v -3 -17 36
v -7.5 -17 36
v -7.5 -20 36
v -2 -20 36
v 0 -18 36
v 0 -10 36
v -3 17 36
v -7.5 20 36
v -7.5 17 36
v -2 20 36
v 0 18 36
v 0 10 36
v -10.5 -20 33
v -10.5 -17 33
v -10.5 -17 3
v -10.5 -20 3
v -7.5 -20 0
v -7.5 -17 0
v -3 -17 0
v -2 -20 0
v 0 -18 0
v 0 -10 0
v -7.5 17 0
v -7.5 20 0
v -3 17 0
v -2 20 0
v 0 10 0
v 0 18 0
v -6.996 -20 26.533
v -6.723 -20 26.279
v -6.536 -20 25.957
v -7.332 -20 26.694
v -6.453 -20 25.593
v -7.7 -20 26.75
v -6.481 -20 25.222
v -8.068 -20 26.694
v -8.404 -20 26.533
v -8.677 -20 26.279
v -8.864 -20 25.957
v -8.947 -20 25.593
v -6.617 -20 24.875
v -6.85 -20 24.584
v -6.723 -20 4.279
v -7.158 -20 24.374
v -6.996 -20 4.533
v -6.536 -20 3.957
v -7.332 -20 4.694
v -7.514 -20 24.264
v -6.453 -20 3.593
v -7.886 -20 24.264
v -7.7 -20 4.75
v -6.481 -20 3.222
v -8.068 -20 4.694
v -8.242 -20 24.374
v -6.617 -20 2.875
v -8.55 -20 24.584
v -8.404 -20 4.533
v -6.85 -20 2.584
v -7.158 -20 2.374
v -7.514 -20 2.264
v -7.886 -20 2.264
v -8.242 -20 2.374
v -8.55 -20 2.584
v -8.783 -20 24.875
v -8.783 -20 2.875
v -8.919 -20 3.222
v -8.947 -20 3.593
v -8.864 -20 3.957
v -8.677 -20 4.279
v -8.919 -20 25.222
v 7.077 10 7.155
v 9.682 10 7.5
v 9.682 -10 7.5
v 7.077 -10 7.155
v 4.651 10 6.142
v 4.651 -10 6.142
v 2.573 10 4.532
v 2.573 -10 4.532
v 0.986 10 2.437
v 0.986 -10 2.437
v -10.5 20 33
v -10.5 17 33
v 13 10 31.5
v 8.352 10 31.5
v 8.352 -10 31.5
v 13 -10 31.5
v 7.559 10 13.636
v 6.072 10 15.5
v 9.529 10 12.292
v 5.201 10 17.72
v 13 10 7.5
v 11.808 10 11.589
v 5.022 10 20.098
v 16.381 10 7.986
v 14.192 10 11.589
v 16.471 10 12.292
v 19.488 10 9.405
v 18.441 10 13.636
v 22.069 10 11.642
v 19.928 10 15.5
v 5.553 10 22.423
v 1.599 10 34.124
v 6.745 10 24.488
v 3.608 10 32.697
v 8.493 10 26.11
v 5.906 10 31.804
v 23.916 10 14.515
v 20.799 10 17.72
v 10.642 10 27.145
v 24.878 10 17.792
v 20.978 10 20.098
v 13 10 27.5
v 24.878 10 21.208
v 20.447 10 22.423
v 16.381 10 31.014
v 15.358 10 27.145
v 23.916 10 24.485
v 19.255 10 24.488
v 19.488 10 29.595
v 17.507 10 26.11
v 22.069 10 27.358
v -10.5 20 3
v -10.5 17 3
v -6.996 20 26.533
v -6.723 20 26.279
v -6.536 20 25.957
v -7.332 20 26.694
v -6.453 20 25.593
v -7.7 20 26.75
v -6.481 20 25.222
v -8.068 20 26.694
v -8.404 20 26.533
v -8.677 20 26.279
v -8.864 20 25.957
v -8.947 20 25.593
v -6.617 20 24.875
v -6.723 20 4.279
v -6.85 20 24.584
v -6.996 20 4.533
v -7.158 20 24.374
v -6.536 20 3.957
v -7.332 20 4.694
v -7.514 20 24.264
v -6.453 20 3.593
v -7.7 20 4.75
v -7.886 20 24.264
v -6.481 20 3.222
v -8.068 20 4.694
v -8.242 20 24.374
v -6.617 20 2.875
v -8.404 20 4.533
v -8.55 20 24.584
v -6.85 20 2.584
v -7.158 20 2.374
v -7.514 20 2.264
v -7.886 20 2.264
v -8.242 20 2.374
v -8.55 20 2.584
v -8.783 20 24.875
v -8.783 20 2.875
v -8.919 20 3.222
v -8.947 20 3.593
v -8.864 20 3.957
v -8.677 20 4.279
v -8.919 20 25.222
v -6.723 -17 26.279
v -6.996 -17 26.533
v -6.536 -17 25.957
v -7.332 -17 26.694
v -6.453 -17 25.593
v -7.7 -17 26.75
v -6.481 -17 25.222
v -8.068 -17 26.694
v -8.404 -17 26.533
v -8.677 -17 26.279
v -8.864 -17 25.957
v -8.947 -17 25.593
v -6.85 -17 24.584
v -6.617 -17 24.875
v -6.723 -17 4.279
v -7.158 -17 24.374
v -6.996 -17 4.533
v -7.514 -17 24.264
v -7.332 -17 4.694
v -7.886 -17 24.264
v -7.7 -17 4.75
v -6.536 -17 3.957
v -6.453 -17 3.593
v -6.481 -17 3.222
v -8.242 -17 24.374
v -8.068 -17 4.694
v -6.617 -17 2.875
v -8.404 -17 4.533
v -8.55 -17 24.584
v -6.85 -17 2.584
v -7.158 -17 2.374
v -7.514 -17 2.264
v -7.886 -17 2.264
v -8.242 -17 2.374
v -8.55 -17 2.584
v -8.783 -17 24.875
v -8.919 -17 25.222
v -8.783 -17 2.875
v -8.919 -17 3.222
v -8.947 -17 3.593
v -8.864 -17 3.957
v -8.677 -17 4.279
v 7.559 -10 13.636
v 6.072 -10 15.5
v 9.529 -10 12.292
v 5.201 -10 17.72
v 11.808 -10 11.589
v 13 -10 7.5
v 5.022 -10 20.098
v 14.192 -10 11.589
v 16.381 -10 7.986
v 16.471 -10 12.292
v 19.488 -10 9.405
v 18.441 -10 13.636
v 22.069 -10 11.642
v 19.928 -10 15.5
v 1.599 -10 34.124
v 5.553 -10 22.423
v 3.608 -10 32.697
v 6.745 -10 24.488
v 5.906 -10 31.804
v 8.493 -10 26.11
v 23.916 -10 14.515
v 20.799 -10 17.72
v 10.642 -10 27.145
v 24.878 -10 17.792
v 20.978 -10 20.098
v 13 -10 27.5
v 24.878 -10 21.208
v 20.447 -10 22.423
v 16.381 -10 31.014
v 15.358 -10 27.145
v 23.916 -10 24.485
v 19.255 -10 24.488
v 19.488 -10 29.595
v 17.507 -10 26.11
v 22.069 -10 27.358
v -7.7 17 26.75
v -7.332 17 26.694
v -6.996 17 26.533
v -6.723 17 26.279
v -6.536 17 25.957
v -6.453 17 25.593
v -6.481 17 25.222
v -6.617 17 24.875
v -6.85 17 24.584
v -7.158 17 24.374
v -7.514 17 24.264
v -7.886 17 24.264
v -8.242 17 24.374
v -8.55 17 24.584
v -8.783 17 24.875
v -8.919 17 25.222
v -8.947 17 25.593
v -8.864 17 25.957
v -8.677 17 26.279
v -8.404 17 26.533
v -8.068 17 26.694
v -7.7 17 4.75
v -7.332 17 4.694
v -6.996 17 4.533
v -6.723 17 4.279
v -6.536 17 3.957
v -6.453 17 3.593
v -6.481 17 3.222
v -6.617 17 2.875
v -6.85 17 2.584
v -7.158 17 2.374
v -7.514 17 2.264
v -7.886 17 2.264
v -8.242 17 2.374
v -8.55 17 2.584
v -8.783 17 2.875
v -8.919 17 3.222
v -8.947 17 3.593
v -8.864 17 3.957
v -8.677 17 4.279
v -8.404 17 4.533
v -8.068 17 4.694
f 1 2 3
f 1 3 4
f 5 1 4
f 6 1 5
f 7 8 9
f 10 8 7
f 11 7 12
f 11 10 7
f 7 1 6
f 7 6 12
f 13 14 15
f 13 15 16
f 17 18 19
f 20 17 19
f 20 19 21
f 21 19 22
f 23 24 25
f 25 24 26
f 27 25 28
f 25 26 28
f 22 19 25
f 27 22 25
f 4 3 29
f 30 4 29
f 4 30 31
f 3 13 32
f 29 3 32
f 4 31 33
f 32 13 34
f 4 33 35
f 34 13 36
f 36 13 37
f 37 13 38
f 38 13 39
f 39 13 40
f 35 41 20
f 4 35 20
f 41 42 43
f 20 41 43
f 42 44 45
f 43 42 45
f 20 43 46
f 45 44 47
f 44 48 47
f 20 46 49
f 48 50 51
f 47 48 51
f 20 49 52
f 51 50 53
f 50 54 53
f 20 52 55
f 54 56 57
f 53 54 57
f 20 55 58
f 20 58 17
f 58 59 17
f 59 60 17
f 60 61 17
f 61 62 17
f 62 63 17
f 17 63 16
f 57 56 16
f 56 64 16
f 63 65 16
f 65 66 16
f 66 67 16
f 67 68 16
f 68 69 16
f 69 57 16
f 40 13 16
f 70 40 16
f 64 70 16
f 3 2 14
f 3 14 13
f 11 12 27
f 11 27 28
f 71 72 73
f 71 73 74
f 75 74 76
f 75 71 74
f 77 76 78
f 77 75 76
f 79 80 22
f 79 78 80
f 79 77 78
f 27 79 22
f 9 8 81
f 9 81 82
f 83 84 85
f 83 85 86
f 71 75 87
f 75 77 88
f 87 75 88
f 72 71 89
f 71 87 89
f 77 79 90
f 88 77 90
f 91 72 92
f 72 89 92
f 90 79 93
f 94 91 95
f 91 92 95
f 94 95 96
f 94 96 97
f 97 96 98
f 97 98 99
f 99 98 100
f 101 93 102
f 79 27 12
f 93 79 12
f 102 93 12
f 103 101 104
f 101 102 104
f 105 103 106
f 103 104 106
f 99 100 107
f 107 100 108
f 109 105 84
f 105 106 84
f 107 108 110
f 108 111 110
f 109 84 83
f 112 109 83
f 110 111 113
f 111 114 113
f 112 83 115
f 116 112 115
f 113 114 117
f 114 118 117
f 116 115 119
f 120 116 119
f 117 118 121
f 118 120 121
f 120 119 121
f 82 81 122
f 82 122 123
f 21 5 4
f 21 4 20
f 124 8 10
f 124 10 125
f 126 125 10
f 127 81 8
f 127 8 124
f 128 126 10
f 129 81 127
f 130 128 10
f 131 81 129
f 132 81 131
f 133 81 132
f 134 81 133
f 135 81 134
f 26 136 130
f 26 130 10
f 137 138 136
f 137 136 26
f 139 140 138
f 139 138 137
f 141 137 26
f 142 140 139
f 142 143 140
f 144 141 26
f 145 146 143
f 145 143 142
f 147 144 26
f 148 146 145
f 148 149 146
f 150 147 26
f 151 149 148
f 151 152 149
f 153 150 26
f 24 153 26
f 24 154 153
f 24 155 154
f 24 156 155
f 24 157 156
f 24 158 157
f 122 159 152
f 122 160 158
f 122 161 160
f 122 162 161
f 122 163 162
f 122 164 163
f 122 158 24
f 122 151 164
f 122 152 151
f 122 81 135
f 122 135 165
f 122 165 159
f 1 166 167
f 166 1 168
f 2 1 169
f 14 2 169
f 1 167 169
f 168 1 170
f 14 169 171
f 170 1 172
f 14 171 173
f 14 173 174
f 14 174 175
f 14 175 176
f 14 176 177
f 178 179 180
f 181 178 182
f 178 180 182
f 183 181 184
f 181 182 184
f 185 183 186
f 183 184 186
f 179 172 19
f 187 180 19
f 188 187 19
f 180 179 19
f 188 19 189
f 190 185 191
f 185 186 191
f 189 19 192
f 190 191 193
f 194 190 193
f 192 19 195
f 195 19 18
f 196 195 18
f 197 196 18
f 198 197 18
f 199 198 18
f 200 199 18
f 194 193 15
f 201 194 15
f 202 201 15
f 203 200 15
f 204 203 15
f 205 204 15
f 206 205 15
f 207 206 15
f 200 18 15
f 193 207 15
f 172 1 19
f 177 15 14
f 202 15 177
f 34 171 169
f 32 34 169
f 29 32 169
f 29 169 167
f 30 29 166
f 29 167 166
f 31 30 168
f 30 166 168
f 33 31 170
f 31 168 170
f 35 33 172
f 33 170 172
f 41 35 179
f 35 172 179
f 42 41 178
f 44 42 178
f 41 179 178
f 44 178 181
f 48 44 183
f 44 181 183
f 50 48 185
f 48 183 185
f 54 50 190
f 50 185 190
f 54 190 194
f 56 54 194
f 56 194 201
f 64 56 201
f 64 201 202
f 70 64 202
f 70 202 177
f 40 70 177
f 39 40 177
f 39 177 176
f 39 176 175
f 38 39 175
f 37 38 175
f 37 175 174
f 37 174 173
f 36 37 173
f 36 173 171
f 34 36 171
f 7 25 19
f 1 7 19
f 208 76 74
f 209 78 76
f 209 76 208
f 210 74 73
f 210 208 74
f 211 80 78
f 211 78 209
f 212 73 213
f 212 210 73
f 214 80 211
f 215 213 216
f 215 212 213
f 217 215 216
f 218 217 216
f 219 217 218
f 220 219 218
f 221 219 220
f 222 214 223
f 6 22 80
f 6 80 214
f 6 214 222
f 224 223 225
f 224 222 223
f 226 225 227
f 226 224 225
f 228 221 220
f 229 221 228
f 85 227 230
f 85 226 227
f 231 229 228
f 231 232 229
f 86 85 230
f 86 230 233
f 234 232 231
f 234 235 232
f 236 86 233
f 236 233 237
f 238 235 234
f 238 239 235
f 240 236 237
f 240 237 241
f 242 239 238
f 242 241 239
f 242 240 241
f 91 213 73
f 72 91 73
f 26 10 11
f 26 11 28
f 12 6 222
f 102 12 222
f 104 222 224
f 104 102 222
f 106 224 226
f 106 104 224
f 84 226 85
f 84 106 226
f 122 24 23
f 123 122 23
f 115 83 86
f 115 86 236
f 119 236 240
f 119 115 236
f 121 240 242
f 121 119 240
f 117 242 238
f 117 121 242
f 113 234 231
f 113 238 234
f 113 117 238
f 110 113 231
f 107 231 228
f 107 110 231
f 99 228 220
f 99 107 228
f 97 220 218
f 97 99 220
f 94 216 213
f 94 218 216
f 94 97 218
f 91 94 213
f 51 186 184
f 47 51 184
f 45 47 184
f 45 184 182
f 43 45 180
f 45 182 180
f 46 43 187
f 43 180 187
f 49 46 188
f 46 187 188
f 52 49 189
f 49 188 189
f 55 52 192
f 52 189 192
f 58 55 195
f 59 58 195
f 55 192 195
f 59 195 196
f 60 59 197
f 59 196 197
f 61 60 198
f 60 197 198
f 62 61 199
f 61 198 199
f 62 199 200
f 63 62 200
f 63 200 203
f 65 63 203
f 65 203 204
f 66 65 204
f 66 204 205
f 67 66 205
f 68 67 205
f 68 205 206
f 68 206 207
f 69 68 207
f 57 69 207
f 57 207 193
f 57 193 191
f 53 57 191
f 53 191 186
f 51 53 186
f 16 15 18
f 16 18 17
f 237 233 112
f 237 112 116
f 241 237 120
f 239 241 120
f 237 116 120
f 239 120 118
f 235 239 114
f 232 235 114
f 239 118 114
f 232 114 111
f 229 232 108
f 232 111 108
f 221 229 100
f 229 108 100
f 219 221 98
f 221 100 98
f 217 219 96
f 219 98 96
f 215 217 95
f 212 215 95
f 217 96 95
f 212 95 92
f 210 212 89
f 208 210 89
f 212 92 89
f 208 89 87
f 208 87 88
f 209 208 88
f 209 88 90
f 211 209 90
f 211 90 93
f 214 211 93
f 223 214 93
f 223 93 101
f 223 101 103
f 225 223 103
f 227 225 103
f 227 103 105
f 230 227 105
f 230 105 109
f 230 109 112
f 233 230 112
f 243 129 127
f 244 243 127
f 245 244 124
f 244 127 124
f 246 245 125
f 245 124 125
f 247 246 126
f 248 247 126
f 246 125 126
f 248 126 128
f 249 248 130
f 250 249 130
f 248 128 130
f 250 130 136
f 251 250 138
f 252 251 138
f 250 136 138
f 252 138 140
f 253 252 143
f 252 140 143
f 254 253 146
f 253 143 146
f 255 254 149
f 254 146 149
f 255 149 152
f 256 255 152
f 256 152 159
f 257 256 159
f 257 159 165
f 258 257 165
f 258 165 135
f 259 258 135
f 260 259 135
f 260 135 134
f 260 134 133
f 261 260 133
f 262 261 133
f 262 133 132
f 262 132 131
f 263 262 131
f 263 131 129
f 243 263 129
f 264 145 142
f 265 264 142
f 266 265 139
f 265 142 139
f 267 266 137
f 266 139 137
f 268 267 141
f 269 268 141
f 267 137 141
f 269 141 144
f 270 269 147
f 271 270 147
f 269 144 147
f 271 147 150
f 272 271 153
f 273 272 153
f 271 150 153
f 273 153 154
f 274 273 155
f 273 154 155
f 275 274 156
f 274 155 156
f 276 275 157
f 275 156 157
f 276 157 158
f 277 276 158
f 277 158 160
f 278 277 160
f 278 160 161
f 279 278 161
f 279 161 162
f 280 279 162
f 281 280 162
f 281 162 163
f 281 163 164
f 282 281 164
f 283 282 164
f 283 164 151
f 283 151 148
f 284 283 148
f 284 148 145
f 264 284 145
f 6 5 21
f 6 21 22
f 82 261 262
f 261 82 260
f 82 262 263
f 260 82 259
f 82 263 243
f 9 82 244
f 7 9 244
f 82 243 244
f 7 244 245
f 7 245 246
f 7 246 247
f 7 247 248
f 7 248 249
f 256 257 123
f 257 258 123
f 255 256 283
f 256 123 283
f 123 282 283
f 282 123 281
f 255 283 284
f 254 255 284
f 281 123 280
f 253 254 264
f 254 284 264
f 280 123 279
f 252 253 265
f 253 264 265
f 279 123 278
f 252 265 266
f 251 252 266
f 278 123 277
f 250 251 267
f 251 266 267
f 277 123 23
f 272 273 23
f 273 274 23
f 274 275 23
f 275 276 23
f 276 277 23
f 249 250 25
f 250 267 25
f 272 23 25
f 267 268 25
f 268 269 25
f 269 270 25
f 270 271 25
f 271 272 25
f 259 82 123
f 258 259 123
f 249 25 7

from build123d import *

# Parameters (mm, degrees)
BOSS_EXTRUDE1_DEPTH = 36
SKETCH2_R           = 1.25
CUT_EXTRUDE1_DEPTH  = 55.829280499
CHAMFER1_SIZE       = 3
SKETCH4_R           = 8
BOSS_EXTRUDE2_DEPTH = 40
FILLET1_R           = 10
SKETCH5_W           = 25
SKETCH5_H           = 10
CUT_EXTRUDE3_DEPTH  = 49.176757882
CHAMFER2_SIZE       = 2


with BuildPart() as part:
    # Sketch1 → Boss-Extrude1 (new body)
    with BuildSketch(Plane.XY):
        Polygon((-10.5, 17), (-3, 17), (-3, -17), (-10.5, -17), (-10.5, -20), (0, -20), (0, 20), (-10.5, 20), align=None)
    extrude(amount=BOSS_EXTRUDE1_DEPTH)

    # Sketch2 → Cut-Extrude1 (cut, through all)
    with BuildSketch(Plane(origin=(0, 20, 0), x_dir=(1, 0, 0), z_dir=(0, 1, 0))):
        with Locations(Location((-7.7, -3.5, 0), (0, 0, 270))):
            Circle(SKETCH2_R)
        with Locations(Location((-7.7, -25.5, 0), (0, 0, 270))):
            Circle(SKETCH2_R)
    extrude(amount=-CUT_EXTRUDE1_DEPTH, mode=Mode.SUBTRACT)

    # Chamfer1
    chamfer1_edges = [part.edges().sort_by_distance(p)[0] for p in [
        (-10.5, 18.5, 0),
        (-10.5, -18.5, 36),
        (-10.5, 18.5, 36),
        (-10.5, -18.5, 0),
    ]]
    chamfer(chamfer1_edges, length=CHAMFER1_SIZE)

    # Sketch4 → Boss-Extrude2 (add, through all)
    with BuildSketch(Plane(origin=(0, 20, 0), x_dir=(1, 0, 0), z_dir=(0, 1, 0))):
        with BuildLine():
            Line((13, -7.5), (0, -7.5))
            Line((0, -7.5), (0, -31.5))
            Line((0, -31.5), (13, -31.5))
            ThreePointArc((13, -31.5), (25, -19.5), (13, -7.5))
        make_face()
        with Locations(Location((13, -19.5, 0), (0, 0, 270))):
            Circle(SKETCH4_R, mode=Mode.SUBTRACT)
    extrude(amount=-BOSS_EXTRUDE2_DEPTH)

    # Fillet1
    # the kernel refuses this fillet: 10 mm, written as the material it adds along each edge
    with BuildSketch(Plane(origin=(0, 20, 7.5), x_dir=(0, 0, -1), z_dir=(0, -1, 0))) as fillet1_piece_1:
        with BuildLine():
            CenterArc((10, 9.682458366), FILLET1_R, 180, 75.522487814)
            Line((0, 9.682458366), (-0.2, 9.682458366))
            Line((-0.2, 9.682458366), (-0.2, 0))
            Line((-0.2, 0), (0, -0.2))
            ThreePointArc((0, -0.2), (3.75, -0.2), (7.45, -0.193649167))
            Line((7.45, -0.193649167), (7.5, 0))
        make_face()
    extrude(amount=40)
    with BuildSketch(Plane(origin=(0, 20, 31.5), x_dir=(1.5375725384245926e-12, 0, 1.0), z_dir=(0, -1, 0))) as fillet1_piece_2:
        with BuildLine():
            CenterArc((10, -8.351646544), FILLET1_R, 123.367012969, 56.632987031)
            Line((0, -8.351646544), (-0.2, -8.351646544))
            Line((-0.2, -8.351646544), (-0.2, 0))
            Line((-0.2, 0), (0, 0.2))
            ThreePointArc((0, 0.2), (2.25, 0.2), (4.39, 0.167032931))
            Line((4.39, 0.167032931), (4.5, 0))
        make_face()
    extrude(amount=40)

    # Sketch5 → Cut-Extrude3 (cut, through all)
    with BuildSketch(Plane.XY.offset(36)):
        with Locations((12.5, 15)):
            Rectangle(SKETCH5_W, SKETCH5_H)
        with Locations((12.5, -15)):
            Rectangle(SKETCH5_W, SKETCH5_H)
    extrude(amount=-CUT_EXTRUDE3_DEPTH, mode=Mode.SUBTRACT)

    # Chamfer2
    chamfer2_edges = [part.edges().sort_by_distance(p)[0] for p in [
        (0, 20, 18),
        (0, -20, 18),
    ]]
    chamfer(chamfer2_edges, length=CHAMFER2_SIZE)


solid = part.part
